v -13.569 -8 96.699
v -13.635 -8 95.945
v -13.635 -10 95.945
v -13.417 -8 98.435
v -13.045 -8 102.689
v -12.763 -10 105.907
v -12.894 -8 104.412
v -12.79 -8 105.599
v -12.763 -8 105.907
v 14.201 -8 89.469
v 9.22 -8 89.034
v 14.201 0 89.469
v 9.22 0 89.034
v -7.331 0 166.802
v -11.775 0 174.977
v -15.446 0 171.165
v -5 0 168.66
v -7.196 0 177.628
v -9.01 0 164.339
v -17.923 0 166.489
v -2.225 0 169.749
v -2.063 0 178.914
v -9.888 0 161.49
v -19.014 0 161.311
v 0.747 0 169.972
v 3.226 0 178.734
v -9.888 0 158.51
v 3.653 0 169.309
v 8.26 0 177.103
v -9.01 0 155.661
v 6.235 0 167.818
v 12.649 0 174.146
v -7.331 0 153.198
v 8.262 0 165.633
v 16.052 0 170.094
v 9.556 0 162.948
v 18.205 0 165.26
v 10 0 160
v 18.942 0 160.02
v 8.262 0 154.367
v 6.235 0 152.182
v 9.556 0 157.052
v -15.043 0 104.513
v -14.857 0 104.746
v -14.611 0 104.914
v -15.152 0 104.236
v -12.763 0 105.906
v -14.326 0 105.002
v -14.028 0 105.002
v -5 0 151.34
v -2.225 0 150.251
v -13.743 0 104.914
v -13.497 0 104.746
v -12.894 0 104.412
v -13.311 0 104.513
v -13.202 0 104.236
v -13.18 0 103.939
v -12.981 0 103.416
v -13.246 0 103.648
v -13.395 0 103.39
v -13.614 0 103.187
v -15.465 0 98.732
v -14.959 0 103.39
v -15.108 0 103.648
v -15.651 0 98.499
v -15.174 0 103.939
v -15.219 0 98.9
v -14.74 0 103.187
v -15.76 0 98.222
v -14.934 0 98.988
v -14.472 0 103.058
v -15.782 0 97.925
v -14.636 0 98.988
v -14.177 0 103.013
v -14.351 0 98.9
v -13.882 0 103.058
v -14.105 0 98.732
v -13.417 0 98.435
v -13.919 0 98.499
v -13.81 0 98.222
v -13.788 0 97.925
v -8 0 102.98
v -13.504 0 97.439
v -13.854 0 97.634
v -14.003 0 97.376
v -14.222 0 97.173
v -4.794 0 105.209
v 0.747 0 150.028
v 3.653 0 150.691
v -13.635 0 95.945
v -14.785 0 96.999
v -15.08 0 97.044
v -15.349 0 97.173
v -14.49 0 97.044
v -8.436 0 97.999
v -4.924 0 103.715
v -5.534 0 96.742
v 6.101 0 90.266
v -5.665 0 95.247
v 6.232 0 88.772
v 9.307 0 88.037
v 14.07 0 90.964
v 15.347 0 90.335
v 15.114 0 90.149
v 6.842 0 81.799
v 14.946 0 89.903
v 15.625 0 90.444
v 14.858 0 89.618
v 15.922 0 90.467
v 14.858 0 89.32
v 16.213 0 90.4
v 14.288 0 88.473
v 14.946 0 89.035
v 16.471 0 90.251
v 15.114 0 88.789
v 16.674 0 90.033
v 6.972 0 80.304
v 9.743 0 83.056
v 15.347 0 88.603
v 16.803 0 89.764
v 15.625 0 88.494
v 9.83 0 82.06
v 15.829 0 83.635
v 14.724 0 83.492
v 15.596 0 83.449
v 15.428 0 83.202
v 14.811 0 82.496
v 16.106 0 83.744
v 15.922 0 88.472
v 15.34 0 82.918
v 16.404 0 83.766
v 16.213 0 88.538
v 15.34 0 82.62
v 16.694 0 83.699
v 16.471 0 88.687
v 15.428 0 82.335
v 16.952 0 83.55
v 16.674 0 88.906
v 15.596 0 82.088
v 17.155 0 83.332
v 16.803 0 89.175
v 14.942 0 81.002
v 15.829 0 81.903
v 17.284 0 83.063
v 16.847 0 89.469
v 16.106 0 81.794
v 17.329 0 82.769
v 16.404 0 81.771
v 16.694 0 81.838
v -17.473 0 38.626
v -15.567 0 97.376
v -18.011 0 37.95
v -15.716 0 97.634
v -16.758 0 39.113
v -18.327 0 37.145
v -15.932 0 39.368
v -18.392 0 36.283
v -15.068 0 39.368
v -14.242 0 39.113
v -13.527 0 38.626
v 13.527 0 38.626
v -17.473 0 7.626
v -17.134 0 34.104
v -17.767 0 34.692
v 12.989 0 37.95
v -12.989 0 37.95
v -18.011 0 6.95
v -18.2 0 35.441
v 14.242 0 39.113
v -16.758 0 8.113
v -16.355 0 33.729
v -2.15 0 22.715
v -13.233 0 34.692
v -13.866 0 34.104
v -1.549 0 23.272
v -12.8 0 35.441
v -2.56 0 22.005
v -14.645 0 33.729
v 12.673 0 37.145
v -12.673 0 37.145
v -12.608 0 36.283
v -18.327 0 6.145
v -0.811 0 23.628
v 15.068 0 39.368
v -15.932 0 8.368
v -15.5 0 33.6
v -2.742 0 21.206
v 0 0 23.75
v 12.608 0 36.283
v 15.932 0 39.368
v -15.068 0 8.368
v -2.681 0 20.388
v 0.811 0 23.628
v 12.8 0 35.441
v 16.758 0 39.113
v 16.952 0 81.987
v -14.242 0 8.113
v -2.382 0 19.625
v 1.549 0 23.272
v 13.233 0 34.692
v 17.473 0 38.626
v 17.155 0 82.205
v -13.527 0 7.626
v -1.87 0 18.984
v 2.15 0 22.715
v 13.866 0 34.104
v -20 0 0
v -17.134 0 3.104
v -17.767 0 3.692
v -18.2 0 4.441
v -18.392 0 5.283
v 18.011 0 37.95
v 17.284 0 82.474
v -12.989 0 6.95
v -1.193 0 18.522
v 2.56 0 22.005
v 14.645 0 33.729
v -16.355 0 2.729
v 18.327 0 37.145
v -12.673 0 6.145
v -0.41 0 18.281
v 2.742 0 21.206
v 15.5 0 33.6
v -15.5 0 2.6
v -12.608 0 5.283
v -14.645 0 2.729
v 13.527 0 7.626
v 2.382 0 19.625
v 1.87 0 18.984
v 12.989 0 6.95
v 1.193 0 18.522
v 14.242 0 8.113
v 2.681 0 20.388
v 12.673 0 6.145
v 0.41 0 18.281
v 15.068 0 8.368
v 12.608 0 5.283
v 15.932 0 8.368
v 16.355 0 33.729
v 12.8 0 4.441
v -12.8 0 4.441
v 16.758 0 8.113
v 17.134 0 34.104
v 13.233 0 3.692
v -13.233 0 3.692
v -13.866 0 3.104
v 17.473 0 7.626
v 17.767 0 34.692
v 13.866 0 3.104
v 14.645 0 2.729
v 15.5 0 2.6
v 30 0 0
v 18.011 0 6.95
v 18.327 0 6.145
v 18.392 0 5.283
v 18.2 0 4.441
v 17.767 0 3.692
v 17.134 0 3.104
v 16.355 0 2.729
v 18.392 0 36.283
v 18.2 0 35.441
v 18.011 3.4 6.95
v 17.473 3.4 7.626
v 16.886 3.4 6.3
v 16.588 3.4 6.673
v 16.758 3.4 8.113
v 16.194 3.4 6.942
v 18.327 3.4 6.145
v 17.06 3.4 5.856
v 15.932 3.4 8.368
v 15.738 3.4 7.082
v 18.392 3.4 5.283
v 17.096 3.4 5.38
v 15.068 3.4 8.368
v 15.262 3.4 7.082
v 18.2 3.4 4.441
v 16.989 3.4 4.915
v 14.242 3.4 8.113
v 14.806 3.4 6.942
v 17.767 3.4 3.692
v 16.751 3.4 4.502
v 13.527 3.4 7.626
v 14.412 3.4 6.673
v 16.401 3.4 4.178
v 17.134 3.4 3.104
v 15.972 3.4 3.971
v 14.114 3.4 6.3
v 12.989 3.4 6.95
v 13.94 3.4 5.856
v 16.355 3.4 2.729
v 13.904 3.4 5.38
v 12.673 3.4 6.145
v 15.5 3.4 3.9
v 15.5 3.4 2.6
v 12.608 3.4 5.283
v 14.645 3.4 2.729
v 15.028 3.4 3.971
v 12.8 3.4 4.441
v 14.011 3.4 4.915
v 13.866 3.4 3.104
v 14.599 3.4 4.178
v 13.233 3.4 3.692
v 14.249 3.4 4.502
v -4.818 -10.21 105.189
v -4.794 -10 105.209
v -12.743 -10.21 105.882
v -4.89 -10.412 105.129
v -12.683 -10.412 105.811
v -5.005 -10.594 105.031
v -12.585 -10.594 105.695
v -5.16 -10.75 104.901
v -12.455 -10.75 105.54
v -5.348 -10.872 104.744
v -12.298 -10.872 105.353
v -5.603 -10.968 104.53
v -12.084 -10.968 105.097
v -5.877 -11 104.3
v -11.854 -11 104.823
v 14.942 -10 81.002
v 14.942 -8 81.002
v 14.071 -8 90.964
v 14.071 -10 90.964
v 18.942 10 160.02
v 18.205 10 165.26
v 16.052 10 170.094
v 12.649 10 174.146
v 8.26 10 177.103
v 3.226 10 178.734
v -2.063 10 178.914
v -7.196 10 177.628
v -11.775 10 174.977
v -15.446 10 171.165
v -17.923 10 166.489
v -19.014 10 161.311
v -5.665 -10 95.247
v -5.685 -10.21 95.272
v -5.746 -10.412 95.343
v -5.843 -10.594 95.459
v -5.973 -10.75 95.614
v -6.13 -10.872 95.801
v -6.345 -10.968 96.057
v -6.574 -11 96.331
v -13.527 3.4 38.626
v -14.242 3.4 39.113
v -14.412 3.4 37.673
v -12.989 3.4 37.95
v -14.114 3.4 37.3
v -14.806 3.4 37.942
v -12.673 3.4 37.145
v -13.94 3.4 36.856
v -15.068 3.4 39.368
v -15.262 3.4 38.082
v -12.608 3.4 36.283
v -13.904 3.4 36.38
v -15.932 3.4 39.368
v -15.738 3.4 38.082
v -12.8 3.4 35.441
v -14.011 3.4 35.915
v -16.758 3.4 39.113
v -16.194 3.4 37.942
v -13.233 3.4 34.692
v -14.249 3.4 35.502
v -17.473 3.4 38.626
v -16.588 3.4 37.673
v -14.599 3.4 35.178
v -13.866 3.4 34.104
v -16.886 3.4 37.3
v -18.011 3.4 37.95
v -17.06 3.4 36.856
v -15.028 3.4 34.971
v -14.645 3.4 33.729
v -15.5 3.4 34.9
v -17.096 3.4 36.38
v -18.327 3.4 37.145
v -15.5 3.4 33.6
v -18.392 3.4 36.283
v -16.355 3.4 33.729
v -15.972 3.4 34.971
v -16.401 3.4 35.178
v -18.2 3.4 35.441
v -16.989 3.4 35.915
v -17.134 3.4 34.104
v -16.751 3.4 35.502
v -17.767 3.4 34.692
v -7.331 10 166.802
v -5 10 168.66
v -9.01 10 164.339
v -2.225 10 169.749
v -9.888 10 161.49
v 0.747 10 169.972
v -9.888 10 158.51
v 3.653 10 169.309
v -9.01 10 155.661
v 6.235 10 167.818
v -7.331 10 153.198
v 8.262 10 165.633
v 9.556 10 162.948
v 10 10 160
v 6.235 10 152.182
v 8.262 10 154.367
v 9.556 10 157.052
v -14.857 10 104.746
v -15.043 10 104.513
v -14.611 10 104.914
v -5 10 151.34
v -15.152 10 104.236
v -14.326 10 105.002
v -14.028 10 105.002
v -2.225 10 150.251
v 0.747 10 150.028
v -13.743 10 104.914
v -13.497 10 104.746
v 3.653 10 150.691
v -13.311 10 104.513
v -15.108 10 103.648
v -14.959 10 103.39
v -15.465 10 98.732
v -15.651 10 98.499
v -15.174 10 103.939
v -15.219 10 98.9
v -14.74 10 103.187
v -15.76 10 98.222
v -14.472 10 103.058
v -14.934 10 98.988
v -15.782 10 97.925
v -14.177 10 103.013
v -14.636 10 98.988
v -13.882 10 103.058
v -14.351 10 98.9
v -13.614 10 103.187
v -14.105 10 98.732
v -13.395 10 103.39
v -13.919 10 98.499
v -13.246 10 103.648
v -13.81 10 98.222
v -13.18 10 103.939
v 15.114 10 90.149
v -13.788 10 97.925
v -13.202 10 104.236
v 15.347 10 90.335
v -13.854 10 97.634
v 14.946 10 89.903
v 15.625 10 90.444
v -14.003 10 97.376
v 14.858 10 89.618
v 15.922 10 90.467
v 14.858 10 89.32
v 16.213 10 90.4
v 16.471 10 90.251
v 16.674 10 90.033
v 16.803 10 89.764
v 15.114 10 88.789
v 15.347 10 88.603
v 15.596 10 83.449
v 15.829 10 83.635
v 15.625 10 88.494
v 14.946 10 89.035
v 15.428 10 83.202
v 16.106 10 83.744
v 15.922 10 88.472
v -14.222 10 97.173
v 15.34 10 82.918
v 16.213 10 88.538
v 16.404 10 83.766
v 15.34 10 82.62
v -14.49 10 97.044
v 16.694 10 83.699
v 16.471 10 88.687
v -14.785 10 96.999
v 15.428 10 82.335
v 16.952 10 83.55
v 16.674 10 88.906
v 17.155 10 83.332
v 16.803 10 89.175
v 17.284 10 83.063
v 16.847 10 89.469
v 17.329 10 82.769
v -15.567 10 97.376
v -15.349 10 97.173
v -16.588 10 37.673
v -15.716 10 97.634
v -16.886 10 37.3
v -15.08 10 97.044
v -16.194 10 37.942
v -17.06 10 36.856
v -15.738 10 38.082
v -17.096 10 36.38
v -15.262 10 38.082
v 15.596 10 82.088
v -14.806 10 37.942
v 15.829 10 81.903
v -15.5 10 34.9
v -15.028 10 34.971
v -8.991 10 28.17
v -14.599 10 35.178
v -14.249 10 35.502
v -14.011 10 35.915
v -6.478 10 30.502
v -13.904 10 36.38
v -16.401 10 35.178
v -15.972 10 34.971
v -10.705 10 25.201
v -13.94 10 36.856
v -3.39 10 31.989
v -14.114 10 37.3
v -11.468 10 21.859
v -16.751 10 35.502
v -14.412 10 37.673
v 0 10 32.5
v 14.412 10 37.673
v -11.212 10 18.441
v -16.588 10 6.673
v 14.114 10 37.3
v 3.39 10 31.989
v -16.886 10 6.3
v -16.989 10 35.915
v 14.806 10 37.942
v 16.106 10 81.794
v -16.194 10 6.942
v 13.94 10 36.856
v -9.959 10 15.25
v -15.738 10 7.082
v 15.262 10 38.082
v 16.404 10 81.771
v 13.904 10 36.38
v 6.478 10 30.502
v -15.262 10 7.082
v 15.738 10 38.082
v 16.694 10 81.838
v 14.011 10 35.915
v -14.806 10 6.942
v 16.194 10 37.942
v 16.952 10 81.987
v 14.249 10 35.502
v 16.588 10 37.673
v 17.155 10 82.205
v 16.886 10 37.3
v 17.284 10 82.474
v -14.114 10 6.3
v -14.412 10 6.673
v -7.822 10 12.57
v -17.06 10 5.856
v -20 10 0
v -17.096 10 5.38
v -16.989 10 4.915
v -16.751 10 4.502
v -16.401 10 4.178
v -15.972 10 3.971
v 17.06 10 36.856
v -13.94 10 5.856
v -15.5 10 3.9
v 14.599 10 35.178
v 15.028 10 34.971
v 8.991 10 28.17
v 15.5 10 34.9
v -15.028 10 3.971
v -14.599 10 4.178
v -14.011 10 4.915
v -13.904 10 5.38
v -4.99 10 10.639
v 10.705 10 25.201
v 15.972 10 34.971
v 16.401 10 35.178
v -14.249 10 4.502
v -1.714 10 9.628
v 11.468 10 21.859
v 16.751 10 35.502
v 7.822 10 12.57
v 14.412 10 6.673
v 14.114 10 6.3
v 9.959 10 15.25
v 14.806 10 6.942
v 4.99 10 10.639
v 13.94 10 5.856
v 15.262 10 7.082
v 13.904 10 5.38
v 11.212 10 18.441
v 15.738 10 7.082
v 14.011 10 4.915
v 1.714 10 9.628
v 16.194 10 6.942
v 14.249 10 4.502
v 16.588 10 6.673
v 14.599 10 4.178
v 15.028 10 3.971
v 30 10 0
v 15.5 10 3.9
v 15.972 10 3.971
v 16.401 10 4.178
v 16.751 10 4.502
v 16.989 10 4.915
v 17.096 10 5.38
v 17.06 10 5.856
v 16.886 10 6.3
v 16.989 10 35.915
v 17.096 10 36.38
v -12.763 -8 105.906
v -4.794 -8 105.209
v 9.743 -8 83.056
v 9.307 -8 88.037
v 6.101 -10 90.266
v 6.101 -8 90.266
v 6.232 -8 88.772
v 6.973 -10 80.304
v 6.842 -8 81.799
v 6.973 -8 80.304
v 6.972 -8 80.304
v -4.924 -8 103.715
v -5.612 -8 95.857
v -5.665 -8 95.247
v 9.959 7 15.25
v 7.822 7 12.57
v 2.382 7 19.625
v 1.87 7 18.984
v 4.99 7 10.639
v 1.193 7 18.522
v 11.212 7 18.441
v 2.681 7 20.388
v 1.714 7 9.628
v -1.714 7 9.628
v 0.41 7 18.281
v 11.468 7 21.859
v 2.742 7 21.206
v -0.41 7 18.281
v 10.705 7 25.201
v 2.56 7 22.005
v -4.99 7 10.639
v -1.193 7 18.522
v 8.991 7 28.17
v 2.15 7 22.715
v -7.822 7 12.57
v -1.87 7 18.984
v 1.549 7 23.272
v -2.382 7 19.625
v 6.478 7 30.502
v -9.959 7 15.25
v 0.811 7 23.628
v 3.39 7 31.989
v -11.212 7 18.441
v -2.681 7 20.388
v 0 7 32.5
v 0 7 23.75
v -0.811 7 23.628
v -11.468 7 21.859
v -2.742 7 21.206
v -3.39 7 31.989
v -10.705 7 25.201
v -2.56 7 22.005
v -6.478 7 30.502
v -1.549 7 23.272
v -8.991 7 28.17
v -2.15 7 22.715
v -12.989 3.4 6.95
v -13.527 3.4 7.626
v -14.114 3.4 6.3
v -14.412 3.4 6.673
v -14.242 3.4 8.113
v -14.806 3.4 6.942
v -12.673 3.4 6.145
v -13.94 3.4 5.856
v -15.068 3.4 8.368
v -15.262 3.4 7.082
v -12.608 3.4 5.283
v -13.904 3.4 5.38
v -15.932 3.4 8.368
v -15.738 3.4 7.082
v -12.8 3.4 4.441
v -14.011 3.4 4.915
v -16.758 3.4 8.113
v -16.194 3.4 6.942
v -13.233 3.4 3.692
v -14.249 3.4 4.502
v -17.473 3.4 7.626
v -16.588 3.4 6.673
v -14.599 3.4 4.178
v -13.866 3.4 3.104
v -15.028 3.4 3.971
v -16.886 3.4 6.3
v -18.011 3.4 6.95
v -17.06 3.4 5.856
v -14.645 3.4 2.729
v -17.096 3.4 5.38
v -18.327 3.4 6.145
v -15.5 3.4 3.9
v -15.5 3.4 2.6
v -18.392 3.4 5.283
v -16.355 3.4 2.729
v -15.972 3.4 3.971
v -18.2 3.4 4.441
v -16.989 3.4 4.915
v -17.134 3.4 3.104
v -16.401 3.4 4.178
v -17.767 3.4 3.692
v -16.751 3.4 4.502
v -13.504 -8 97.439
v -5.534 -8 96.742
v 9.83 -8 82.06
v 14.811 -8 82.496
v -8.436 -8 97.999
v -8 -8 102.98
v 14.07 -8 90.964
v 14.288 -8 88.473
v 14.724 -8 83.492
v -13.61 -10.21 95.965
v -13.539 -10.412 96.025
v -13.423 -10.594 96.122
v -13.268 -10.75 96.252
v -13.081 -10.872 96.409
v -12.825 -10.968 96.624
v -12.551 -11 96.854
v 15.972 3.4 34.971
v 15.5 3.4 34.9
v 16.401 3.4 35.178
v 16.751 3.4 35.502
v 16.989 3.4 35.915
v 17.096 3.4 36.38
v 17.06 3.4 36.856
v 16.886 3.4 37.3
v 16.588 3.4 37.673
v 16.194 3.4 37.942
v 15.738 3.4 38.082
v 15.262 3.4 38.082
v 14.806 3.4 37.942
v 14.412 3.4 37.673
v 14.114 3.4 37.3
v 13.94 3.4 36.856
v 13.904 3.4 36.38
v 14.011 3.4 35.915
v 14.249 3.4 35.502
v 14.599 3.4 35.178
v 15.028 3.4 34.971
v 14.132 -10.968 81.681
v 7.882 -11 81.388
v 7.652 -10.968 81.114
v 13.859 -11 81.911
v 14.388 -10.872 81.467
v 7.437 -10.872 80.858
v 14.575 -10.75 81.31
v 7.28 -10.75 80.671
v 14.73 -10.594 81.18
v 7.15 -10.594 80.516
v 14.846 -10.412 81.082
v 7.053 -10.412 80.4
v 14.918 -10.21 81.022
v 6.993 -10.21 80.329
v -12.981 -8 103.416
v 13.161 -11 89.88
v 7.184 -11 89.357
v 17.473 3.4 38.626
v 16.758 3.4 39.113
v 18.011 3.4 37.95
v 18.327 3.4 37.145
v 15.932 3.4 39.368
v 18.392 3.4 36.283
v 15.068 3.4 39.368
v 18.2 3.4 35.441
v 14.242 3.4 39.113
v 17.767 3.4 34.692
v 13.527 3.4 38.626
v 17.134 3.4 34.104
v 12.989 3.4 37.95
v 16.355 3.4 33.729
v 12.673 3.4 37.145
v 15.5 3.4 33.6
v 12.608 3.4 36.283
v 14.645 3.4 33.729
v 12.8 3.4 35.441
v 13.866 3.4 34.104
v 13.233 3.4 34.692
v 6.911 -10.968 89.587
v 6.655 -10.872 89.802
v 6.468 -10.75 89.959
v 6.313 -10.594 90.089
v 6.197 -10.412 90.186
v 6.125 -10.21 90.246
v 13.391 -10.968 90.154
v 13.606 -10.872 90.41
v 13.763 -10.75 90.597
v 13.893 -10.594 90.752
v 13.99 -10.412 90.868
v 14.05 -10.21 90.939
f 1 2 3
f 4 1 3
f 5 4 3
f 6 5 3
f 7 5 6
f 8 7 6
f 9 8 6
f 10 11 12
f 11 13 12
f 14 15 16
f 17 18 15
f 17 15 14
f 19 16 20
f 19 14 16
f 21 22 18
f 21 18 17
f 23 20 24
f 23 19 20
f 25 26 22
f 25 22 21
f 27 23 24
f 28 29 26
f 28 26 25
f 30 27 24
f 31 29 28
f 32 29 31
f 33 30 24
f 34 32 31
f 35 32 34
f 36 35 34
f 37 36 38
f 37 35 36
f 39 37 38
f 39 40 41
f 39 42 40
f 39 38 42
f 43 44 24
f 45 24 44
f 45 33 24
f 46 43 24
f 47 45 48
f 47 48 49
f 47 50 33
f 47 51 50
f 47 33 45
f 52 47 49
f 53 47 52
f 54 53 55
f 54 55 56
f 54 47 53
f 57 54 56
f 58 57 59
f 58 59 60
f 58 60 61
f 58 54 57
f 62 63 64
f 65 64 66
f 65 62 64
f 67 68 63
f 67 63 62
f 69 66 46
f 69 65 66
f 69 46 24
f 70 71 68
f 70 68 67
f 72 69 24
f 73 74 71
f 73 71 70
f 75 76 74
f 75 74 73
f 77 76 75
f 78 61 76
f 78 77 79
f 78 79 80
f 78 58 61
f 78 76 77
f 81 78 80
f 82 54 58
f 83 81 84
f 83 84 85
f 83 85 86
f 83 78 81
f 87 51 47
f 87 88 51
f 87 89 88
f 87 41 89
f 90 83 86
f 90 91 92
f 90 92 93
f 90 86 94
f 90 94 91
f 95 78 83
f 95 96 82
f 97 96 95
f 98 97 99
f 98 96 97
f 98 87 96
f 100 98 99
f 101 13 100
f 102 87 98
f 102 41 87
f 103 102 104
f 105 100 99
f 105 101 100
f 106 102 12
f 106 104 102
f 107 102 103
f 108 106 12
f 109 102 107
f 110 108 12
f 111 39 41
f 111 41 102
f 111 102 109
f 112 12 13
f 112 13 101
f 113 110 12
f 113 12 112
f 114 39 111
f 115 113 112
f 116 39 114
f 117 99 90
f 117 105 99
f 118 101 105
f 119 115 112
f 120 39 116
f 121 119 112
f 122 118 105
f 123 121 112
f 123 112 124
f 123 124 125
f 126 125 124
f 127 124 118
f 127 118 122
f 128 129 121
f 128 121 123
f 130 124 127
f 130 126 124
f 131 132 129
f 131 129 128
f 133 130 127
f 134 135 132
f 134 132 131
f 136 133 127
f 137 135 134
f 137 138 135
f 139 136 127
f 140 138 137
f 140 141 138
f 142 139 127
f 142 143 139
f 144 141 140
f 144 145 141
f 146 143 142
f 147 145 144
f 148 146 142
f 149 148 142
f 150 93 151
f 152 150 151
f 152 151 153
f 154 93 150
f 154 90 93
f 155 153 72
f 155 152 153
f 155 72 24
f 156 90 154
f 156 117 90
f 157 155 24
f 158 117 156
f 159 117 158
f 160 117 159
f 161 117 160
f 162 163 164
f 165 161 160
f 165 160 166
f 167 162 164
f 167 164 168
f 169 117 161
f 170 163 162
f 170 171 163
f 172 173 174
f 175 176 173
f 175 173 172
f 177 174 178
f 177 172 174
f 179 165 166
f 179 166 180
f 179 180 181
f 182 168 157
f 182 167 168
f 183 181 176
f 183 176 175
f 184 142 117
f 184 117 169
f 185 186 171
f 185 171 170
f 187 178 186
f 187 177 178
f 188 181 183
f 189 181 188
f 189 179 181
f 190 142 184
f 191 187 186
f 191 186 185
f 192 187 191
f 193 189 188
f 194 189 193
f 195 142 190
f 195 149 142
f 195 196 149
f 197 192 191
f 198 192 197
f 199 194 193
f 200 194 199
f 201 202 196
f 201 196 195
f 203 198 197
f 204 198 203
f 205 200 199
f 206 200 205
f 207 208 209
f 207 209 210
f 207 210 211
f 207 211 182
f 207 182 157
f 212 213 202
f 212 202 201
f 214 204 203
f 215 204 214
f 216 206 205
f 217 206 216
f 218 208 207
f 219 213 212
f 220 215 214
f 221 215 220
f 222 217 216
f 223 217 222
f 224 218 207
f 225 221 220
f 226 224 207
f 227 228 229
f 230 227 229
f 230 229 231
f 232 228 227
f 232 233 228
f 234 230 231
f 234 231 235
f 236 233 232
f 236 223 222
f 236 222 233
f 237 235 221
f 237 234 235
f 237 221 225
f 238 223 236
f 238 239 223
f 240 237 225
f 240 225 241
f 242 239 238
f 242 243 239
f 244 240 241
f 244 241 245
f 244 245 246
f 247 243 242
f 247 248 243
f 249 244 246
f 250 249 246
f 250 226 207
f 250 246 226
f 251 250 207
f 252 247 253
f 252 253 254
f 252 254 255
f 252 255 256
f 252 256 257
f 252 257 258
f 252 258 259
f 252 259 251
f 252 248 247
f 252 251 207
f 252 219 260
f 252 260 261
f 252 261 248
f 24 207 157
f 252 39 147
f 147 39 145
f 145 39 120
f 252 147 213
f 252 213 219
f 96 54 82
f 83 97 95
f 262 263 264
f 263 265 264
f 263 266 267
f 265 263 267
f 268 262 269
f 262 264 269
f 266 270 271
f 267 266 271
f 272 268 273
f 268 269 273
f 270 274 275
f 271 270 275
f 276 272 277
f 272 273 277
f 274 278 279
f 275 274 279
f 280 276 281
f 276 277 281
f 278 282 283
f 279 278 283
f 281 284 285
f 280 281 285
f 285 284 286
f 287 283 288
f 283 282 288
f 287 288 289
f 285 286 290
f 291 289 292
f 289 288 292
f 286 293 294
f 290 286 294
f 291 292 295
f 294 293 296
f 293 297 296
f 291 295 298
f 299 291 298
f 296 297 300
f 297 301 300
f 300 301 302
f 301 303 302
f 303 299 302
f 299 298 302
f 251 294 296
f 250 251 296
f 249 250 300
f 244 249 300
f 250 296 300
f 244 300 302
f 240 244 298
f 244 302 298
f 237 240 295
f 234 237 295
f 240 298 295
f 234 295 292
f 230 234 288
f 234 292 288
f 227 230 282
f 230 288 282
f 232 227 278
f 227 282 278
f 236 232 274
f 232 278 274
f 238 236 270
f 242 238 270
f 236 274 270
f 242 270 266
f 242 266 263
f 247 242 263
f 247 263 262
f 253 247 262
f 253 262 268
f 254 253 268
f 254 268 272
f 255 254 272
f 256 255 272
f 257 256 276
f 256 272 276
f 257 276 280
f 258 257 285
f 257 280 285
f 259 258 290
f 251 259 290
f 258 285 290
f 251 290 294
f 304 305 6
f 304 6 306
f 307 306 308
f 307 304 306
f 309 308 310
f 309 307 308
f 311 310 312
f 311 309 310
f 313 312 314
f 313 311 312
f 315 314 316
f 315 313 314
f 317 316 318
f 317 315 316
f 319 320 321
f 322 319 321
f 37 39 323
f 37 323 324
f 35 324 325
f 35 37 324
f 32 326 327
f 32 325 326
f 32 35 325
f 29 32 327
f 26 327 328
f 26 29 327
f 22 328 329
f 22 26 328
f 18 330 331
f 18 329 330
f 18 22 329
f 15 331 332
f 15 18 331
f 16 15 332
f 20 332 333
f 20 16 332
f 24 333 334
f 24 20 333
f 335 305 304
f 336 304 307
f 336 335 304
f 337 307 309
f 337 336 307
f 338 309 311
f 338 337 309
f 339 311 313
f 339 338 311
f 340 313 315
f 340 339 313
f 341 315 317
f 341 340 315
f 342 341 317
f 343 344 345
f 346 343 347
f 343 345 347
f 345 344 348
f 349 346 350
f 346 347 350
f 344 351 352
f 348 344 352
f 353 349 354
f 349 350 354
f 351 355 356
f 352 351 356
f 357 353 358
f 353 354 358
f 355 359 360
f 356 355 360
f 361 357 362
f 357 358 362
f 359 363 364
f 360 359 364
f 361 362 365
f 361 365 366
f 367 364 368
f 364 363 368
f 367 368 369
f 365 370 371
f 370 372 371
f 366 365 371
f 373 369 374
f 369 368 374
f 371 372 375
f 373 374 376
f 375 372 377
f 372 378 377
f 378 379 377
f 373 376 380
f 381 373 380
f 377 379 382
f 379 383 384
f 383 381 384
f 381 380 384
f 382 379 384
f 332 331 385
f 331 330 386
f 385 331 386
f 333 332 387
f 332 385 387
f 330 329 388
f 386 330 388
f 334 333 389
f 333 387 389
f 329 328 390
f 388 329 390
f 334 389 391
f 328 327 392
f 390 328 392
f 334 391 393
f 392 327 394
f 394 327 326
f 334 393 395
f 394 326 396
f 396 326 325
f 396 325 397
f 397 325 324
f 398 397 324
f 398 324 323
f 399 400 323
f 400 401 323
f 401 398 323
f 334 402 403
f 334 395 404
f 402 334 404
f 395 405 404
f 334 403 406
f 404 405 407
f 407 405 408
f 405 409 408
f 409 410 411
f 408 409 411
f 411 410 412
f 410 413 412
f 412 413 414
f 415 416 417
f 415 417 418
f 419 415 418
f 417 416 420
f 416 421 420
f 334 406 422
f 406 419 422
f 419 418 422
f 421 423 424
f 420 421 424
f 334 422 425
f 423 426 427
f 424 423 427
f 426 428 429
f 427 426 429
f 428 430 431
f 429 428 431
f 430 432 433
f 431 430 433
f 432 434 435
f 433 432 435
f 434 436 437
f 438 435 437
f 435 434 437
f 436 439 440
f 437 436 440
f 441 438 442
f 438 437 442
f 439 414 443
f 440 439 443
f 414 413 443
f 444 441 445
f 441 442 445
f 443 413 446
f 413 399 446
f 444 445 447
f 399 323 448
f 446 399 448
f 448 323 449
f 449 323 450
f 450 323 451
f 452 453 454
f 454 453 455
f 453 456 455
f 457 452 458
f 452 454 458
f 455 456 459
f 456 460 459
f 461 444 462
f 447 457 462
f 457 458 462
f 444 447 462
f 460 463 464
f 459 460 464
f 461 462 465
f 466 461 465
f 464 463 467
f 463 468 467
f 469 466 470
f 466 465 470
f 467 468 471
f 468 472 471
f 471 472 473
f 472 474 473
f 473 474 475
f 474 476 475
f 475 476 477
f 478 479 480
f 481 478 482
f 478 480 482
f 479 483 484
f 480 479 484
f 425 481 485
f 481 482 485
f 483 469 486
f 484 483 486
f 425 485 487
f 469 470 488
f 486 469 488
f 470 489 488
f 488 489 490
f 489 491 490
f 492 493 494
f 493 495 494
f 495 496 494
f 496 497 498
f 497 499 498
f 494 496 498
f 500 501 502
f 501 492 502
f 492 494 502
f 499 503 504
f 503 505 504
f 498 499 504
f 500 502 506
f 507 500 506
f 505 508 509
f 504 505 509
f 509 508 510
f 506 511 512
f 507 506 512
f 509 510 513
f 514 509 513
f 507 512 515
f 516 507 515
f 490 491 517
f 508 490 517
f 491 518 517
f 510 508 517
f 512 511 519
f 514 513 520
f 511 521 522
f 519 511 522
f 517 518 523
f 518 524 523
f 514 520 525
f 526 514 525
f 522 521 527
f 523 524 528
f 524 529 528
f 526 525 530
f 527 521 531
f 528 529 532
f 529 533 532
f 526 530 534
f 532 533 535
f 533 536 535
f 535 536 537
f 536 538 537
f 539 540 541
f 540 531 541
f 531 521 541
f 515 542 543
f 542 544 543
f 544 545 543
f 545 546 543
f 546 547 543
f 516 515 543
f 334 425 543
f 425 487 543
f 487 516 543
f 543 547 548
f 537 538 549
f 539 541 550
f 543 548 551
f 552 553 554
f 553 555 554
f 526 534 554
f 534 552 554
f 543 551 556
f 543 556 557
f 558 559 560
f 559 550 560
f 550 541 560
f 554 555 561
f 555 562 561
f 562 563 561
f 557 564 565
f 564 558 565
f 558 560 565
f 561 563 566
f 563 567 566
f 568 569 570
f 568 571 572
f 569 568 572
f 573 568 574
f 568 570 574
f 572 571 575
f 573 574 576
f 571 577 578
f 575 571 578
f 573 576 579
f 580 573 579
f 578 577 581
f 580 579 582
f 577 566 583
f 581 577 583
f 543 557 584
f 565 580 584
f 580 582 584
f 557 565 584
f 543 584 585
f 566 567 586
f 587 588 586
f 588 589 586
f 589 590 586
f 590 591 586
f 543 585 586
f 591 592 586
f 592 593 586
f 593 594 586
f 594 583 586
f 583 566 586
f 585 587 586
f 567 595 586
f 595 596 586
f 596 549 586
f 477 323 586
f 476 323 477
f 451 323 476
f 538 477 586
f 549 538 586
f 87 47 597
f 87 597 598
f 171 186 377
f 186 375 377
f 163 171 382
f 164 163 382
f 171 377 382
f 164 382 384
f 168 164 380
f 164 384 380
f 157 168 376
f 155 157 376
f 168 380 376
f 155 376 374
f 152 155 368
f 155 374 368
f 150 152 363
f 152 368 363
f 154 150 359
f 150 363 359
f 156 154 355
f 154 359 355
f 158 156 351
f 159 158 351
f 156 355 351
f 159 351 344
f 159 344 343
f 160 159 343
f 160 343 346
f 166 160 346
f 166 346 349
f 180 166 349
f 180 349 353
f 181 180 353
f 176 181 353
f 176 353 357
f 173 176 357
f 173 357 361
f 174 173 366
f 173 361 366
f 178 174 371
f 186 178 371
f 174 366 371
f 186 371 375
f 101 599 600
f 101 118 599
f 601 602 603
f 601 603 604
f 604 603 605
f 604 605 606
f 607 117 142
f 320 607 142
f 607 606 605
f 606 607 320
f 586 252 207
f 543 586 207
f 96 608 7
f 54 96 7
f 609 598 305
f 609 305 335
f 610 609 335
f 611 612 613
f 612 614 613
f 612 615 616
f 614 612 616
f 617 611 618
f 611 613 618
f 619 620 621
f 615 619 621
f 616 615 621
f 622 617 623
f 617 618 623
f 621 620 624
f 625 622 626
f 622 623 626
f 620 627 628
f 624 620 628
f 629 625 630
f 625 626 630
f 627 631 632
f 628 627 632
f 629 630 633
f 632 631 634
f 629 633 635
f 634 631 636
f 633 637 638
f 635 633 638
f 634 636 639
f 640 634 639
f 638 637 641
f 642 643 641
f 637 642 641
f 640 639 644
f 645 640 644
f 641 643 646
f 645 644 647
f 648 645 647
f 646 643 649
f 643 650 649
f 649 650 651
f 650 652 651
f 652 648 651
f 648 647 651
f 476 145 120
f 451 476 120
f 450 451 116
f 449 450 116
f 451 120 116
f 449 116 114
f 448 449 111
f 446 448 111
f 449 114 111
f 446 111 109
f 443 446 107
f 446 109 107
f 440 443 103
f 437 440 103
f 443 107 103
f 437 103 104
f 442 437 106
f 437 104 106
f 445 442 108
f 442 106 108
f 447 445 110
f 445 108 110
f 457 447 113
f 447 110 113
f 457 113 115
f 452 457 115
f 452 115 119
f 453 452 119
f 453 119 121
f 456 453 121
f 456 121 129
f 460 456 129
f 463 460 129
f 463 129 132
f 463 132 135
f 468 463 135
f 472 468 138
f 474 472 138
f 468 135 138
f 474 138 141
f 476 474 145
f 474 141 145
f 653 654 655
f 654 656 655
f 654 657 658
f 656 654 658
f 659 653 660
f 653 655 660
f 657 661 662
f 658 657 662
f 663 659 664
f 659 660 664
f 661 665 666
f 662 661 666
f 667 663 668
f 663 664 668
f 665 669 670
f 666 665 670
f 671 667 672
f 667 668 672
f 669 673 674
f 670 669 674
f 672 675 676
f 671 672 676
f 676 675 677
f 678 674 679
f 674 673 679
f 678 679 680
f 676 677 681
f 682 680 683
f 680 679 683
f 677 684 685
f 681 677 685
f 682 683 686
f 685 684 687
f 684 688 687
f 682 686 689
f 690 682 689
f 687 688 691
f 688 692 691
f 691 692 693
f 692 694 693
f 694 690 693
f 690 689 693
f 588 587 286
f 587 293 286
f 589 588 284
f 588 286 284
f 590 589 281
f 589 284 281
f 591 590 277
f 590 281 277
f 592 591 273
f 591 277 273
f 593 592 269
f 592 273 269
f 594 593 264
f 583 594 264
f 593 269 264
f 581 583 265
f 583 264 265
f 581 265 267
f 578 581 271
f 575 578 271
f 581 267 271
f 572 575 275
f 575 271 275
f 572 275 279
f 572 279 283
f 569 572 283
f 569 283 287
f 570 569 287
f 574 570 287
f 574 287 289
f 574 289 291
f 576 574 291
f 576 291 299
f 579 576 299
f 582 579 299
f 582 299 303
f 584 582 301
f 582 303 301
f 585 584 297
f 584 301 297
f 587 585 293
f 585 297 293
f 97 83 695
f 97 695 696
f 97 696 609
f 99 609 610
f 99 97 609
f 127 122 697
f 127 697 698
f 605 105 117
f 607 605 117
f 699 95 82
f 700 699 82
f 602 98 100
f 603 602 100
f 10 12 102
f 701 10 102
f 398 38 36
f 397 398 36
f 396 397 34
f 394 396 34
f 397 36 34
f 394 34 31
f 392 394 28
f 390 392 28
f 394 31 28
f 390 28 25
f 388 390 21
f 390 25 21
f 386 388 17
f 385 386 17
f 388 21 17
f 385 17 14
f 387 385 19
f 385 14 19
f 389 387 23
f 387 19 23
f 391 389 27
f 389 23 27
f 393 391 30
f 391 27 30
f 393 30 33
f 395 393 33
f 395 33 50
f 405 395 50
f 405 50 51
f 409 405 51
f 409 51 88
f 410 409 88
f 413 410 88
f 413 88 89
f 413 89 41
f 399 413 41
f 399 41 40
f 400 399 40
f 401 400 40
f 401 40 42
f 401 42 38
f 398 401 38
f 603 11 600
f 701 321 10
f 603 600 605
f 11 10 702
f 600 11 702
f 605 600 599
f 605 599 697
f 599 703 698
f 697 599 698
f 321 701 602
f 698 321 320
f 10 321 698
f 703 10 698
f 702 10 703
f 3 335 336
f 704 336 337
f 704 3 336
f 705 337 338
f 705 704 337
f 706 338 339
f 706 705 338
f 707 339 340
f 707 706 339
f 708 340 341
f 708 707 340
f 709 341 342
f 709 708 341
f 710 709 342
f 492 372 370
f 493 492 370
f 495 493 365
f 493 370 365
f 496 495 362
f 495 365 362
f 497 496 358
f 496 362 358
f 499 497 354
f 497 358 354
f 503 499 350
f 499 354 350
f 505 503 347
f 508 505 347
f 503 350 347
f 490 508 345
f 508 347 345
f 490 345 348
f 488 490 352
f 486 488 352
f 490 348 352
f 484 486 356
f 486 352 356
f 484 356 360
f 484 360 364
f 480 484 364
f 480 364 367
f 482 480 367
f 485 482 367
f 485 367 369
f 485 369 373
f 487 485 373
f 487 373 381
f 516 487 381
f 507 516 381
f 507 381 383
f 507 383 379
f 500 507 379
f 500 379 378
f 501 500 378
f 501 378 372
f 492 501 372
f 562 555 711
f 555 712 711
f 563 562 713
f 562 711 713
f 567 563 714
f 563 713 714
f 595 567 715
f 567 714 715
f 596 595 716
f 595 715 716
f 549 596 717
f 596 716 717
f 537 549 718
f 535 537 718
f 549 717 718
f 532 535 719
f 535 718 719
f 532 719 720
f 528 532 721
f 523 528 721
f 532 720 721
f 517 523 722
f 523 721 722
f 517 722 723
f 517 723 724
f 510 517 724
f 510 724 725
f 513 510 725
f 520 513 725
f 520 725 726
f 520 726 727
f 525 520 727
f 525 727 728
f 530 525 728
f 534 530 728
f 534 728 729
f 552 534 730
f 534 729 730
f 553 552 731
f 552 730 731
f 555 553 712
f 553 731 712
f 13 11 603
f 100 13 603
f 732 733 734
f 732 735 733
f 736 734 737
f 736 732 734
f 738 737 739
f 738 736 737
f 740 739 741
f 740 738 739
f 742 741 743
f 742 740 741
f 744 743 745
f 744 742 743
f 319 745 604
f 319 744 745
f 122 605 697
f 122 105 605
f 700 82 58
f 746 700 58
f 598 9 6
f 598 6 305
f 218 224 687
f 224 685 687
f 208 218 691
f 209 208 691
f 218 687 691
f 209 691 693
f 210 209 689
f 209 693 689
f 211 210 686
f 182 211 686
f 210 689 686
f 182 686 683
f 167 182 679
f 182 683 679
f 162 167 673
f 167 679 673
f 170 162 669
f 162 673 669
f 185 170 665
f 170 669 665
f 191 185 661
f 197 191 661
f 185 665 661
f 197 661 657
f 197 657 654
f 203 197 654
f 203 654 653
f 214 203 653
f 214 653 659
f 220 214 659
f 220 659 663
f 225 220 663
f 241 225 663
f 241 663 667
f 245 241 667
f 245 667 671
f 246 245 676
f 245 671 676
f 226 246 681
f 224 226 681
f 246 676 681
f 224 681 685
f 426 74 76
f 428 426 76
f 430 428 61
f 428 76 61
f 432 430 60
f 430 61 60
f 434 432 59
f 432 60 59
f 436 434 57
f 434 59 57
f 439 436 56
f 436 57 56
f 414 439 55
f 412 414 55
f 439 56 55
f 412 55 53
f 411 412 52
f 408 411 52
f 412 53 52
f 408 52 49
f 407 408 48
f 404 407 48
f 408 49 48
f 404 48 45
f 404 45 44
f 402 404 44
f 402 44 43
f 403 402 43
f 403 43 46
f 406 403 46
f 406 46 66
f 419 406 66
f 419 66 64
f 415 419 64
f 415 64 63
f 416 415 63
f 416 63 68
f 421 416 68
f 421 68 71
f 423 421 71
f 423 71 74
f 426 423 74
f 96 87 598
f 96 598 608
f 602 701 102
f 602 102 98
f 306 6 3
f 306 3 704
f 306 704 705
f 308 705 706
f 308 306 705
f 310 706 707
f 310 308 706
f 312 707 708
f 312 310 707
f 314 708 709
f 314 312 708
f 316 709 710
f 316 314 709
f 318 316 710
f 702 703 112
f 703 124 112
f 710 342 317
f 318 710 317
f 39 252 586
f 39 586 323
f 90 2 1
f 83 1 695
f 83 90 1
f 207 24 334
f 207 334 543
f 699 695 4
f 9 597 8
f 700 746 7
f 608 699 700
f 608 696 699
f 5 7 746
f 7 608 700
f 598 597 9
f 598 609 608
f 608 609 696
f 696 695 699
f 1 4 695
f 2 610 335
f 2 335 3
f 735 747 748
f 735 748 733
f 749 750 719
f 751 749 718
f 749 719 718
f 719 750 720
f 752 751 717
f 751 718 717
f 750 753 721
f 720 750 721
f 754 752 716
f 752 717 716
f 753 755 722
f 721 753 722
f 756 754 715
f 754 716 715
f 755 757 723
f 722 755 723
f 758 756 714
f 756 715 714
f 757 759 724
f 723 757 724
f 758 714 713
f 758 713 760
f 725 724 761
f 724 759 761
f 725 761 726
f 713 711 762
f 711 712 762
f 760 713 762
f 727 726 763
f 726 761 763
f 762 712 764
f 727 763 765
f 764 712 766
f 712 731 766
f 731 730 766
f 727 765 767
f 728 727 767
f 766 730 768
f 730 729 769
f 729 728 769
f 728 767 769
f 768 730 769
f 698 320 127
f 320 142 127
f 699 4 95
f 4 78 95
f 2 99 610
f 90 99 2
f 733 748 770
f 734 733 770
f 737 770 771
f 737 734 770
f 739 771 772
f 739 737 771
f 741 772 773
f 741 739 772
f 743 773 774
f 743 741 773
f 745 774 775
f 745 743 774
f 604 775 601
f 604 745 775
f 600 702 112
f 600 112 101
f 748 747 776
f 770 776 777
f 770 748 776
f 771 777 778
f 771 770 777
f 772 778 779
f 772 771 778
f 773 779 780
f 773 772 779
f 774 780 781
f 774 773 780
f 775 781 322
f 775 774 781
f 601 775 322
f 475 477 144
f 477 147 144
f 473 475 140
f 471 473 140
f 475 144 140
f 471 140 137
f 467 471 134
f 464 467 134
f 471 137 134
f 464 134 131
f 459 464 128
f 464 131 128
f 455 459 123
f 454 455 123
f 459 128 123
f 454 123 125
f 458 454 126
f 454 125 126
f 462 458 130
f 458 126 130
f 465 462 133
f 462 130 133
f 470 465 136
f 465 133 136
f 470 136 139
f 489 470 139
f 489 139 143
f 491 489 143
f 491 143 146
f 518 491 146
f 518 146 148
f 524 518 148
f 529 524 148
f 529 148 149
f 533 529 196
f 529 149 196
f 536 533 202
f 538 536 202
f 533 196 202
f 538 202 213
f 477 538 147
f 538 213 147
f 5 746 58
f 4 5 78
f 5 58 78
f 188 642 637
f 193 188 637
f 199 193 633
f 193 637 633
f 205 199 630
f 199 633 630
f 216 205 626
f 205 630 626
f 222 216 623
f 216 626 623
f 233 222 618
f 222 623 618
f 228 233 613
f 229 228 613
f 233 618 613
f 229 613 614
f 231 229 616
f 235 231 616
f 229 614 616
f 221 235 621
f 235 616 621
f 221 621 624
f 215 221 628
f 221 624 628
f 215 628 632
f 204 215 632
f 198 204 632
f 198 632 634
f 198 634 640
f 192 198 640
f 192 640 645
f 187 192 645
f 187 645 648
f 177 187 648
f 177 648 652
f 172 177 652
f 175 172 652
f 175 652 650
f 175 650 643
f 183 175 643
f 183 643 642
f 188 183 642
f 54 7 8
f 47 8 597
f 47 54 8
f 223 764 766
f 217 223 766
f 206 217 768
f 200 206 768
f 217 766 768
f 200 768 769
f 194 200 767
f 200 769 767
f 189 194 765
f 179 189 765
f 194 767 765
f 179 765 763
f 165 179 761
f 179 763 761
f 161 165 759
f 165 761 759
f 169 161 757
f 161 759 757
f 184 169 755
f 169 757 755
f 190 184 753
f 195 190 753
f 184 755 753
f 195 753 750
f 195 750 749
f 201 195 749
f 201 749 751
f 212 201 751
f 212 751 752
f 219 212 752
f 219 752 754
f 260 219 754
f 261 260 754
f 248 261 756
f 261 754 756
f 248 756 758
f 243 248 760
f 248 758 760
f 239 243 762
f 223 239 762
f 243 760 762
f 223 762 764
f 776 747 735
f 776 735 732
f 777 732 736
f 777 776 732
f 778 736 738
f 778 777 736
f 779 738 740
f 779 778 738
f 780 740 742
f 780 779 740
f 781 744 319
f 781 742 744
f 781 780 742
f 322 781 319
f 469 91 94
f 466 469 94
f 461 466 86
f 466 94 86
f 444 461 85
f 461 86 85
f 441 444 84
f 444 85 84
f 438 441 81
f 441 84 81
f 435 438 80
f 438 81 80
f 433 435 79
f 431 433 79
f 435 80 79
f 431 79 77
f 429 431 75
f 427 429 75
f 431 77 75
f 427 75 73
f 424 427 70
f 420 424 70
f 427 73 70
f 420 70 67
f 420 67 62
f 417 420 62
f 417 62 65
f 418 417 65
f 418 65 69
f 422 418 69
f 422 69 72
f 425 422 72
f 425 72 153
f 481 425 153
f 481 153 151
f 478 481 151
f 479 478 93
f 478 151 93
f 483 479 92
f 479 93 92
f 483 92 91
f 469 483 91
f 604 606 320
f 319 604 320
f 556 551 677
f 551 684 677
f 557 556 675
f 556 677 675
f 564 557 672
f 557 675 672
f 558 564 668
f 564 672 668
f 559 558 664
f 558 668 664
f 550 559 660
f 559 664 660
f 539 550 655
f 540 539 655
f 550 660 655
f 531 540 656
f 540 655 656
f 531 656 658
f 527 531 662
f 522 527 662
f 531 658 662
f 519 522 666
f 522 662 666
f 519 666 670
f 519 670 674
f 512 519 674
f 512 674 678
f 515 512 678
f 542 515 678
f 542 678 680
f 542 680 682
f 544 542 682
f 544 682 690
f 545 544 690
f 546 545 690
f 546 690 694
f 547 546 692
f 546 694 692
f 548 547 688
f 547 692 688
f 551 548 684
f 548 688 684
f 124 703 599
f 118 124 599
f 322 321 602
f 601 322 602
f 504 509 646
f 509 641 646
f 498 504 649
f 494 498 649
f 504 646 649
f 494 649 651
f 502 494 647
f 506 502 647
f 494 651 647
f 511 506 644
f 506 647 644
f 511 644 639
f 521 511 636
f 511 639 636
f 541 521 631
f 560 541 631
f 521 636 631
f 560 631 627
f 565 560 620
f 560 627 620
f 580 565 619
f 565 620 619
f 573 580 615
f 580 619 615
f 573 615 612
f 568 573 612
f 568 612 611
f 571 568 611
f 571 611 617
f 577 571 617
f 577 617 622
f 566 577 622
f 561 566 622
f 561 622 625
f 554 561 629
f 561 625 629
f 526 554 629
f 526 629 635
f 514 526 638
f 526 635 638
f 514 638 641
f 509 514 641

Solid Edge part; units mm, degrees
sketch "Sketch1" plane through (0, 0, 0) normal (0, -1, 0) x (1, 0, 0)
  line L0 (30, 0) -> (18.9422, 160.02)
  line L1 (-19.0139, 161.311) -> (-20, 0)
  line L2 (30, 0) -> (-20, 0)
  arc A0 (-19.0139, 161.311) -> (18.9422, 160.02) centre (-0.0578, 160.02) cw
extrude "Protrusion1" add sketch "Sketch1" against normal blind 10
sketch "Sketch2" plane through (0, 0, 0) normal (0, -1, 0) x (1, 0, 0)
  circle A0 centre (0, 160) radius 10
extrude "ExtrudedCutout_1" cut sketch "Sketch2" against normal blind 10
hole "Hole_1" at (-15.5, 0, 5.5) direction (0, 1, 0) diameter 3.2 end through all counterbore diameter 5.8 counterbore depth 3.4
pattern_linear "Pattern1" count 2 spacing 31 along (1, 0, 0) count 2 spacing 31 along (0, 0, 1) of "Hole_1"
hole "Hole_2" at (0, 10, 21) direction (0, -1, 0) diameter 5.5 end through all counterbore diameter 23 counterbore depth 3
sketch "Sketch3" plane through (0, 0, 89.51) normal (0, -1, 0) x (1, 0, 0)
  line L0 (9.2202, -0.4765) -> (6.2316, -0.7379)
  line L1 (6.1009, 0.7564) -> (6.2316, -0.7379)
  line L2 (14.0705, 1.4536) -> (6.1009, 0.7564)
  line L3 (14.2012, -0.0407) -> (14.0705, 1.4536)
  line L4 (9.2202, -0.4765) -> (14.2012, -0.0407)
  line L5 (14.7241, -6.0178) -> (9.7432, -6.4536)
  line L6 (9.7432, -6.4536) -> (9.3074, -1.4727)
  line L7 (14.2883, -1.0369) -> (9.3074, -1.4727)
  line L8 (14.7241, -6.0178) -> (14.2883, -1.0369)
  line L9 (9.8303, -7.4498) -> (14.8113, -7.014)
  line L10 (14.942, -8.5083) -> (14.8113, -7.014)
  line L11 (6.9725, -9.2056) -> (14.942, -8.5083)
  line L12 (6.8417, -7.7113) -> (6.9725, -9.2056)
  line L13 (6.8417, -7.7113) -> (9.8303, -7.4498)
  dimension "D1" = 10
  dimension "D2" = 8
  dimension "D3" = 7.5
  dimension "D4" = 5
  dimension "D5" = 3
  dimension "D6" = 2
  dimension "D7" = 2
  dimension "D8" = 10
  dimension "D9" = 8
  dimension "D10" = 1.5
  dimension "D11" = 5
  dimension "D12" = 5
  dimension "D13" = 5
  dimension "D14" = 1.5
  dimension "D15" = 1.5
extrude "ExtrudedProtrusion_2" add sketch "Sketch3" along normal blind 8
sketch "Sketch4" plane through (0, 0, 89.51) normal (0, -1, 0) x (1, 0, 0)
  circle A0 centre (15.8473, -0.0407) radius 1
  circle A1 centre (16.3289, -6.7414) radius 1
  dimension "D1" = 10
  dimension "D2" = 8
  dimension "D3" = 7.5
  dimension "D4" = 5
  dimension "D5" = 3
  dimension "D6" = 2
  dimension "D7" = 2
  dimension "D8" = 10
  dimension "D9" = 8
  dimension "D10" = 1.5
  dimension "D11" = 5
  dimension "D12" = 5
  dimension "D13" = 5
  dimension "D14" = 1.5
  dimension "D15" = 1.5
extrude "ExtrudedCutout_3" cut sketch "Sketch4" against normal blind 10
sketch "Sketch5" plane through (12.0158, -8, 85.7648) normal (0, -1, 0) x (0.9962, 0, 0.0872)
  line L0 (-5.5, 5) -> (-5.5, -5)
  line L1 (-5.5, -5) -> (2.5, -5)
  line L2 (2.5, -5) -> (2.5, 5)
  line L3 (2.5, 5) -> (-5.5, 5)
extrude "ExtrudedProtrusion_3" add sketch "Sketch5" along normal blind 3
sketch "Sketch6" plane through (0, 0, 89.51) normal (0, -1, 0) x (1, 0, 0)
  line L0 (-12.7631, 16.3965) -> (-4.7936, 15.6993)
  line L1 (-4.7936, 15.6993) -> (-4.9243, 14.205)
  line L2 (-4.9243, 14.205) -> (-12.8939, 14.9022)
  line L3 (-12.8939, 14.9022) -> (-12.7631, 16.3965)
  line L4 (-8.4358, 8.4893) -> (-8, 13.4703)
  line L5 (-8, 13.4703) -> (-12.981, 13.906)
  line L6 (-12.981, 13.906) -> (-13.4168, 8.9251)
  line L7 (-13.4168, 8.9251) -> (-8.4358, 8.4893)
  line L8 (-13.5039, 7.9289) -> (-5.5344, 7.2316)
  line L9 (-5.5344, 7.2316) -> (-5.6651, 5.7373)
  line L10 (-5.6651, 5.7373) -> (-13.6347, 6.4346)
  line L11 (-13.6347, 6.4346) -> (-13.5039, 7.9289)
  dimension "D1" = 10
  dimension "D2" = 8
  dimension "D3" = 7.5
  dimension "D4" = 5
  dimension "D5" = 3
  dimension "D6" = 2
  dimension "D7" = 2
  dimension "D8" = 10
  dimension "D9" = 8
  dimension "D10" = 1.5
  dimension "D11" = 5
  dimension "D12" = 5
  dimension "D13" = 5
  dimension "D14" = 1.5
  dimension "D15" = 1.5
extrude "ExtrudedProtrusion_4" add sketch "Sketch6" along normal blind 8
sketch "Sketch7" plane through (-10.7084, -8, 100.7077) normal (0, -1, 0) x (0.9962, 0, -0.0872)
  line L0 (5.5, 5) -> (5.5, -5)
  line L1 (5.5, -5) -> (-2.5, -5)
  line L2 (-2.5, -5) -> (-2.5, 5)
  line L3 (-2.5, 5) -> (5.5, 5)
extrude "ExtrudedProtrusion_5" add sketch "Sketch7" along normal blind 3
hole "Hole1" at (-14.1769, 0, 104.0133) direction (0, 1, 0) diameter 2 end up to next
hole "Hole2" at (-14.7852, 0, 97.9993) direction (0, 1, 0) diameter 2 end up to next
fillet "Round_1" [suppressed]
fillet "Round_2" radius 1 4 edges at (-8.7783, -11, 105.5579) (-13.1989, -11, 100.9256) (-9.6499, -11, 95.596) (-5.2293, -11, 100.2283)
fillet "Round_3" radius 1 4 edges at (10.0857, -11, 90.615) (6.5367, -11, 85.2854) (10.9572, -11, 80.653) (14.5062, -11, 85.9826)
fillet "Round_4" [suppressed]
